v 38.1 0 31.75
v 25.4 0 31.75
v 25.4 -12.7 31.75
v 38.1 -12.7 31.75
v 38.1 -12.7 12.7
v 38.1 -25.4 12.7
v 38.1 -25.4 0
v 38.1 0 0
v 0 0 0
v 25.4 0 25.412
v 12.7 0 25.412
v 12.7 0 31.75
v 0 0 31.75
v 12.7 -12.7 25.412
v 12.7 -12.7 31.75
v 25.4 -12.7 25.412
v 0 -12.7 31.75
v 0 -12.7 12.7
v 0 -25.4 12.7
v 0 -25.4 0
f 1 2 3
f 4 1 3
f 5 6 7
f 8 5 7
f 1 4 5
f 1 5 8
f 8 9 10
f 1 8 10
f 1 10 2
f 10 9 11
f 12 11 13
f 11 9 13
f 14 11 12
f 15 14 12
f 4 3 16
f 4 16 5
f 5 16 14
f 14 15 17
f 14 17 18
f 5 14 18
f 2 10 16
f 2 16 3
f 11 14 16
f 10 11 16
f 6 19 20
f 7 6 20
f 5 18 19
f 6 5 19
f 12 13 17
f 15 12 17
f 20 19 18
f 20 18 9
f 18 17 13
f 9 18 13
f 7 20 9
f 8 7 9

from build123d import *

# Parameters (mm, degrees)
F1_DEPTH = 38.1
F2_W     = 12.7
F2_H     = 6.35
F3_DEPTH = 12.7


with BuildPart() as f1:
    # F0 (on Right) → F1 (new body)
    with BuildSketch(Plane.YZ):
        Polygon((0, 0), (0, 31.75), (-12.7, 31.75), (-12.7, 12.7), (-25.4, 12.7), (-25.4, 0), align=None)
    extrude(amount=F1_DEPTH)

    # F2 (on Front) → F3 (cut)
    with BuildSketch(Plane.XZ):
        with Locations((19.05, 28.587072)):
            Rectangle(F2_W, F2_H)
    extrude(amount=F3_DEPTH, mode=Mode.SUBTRACT)


solid = f1.part
